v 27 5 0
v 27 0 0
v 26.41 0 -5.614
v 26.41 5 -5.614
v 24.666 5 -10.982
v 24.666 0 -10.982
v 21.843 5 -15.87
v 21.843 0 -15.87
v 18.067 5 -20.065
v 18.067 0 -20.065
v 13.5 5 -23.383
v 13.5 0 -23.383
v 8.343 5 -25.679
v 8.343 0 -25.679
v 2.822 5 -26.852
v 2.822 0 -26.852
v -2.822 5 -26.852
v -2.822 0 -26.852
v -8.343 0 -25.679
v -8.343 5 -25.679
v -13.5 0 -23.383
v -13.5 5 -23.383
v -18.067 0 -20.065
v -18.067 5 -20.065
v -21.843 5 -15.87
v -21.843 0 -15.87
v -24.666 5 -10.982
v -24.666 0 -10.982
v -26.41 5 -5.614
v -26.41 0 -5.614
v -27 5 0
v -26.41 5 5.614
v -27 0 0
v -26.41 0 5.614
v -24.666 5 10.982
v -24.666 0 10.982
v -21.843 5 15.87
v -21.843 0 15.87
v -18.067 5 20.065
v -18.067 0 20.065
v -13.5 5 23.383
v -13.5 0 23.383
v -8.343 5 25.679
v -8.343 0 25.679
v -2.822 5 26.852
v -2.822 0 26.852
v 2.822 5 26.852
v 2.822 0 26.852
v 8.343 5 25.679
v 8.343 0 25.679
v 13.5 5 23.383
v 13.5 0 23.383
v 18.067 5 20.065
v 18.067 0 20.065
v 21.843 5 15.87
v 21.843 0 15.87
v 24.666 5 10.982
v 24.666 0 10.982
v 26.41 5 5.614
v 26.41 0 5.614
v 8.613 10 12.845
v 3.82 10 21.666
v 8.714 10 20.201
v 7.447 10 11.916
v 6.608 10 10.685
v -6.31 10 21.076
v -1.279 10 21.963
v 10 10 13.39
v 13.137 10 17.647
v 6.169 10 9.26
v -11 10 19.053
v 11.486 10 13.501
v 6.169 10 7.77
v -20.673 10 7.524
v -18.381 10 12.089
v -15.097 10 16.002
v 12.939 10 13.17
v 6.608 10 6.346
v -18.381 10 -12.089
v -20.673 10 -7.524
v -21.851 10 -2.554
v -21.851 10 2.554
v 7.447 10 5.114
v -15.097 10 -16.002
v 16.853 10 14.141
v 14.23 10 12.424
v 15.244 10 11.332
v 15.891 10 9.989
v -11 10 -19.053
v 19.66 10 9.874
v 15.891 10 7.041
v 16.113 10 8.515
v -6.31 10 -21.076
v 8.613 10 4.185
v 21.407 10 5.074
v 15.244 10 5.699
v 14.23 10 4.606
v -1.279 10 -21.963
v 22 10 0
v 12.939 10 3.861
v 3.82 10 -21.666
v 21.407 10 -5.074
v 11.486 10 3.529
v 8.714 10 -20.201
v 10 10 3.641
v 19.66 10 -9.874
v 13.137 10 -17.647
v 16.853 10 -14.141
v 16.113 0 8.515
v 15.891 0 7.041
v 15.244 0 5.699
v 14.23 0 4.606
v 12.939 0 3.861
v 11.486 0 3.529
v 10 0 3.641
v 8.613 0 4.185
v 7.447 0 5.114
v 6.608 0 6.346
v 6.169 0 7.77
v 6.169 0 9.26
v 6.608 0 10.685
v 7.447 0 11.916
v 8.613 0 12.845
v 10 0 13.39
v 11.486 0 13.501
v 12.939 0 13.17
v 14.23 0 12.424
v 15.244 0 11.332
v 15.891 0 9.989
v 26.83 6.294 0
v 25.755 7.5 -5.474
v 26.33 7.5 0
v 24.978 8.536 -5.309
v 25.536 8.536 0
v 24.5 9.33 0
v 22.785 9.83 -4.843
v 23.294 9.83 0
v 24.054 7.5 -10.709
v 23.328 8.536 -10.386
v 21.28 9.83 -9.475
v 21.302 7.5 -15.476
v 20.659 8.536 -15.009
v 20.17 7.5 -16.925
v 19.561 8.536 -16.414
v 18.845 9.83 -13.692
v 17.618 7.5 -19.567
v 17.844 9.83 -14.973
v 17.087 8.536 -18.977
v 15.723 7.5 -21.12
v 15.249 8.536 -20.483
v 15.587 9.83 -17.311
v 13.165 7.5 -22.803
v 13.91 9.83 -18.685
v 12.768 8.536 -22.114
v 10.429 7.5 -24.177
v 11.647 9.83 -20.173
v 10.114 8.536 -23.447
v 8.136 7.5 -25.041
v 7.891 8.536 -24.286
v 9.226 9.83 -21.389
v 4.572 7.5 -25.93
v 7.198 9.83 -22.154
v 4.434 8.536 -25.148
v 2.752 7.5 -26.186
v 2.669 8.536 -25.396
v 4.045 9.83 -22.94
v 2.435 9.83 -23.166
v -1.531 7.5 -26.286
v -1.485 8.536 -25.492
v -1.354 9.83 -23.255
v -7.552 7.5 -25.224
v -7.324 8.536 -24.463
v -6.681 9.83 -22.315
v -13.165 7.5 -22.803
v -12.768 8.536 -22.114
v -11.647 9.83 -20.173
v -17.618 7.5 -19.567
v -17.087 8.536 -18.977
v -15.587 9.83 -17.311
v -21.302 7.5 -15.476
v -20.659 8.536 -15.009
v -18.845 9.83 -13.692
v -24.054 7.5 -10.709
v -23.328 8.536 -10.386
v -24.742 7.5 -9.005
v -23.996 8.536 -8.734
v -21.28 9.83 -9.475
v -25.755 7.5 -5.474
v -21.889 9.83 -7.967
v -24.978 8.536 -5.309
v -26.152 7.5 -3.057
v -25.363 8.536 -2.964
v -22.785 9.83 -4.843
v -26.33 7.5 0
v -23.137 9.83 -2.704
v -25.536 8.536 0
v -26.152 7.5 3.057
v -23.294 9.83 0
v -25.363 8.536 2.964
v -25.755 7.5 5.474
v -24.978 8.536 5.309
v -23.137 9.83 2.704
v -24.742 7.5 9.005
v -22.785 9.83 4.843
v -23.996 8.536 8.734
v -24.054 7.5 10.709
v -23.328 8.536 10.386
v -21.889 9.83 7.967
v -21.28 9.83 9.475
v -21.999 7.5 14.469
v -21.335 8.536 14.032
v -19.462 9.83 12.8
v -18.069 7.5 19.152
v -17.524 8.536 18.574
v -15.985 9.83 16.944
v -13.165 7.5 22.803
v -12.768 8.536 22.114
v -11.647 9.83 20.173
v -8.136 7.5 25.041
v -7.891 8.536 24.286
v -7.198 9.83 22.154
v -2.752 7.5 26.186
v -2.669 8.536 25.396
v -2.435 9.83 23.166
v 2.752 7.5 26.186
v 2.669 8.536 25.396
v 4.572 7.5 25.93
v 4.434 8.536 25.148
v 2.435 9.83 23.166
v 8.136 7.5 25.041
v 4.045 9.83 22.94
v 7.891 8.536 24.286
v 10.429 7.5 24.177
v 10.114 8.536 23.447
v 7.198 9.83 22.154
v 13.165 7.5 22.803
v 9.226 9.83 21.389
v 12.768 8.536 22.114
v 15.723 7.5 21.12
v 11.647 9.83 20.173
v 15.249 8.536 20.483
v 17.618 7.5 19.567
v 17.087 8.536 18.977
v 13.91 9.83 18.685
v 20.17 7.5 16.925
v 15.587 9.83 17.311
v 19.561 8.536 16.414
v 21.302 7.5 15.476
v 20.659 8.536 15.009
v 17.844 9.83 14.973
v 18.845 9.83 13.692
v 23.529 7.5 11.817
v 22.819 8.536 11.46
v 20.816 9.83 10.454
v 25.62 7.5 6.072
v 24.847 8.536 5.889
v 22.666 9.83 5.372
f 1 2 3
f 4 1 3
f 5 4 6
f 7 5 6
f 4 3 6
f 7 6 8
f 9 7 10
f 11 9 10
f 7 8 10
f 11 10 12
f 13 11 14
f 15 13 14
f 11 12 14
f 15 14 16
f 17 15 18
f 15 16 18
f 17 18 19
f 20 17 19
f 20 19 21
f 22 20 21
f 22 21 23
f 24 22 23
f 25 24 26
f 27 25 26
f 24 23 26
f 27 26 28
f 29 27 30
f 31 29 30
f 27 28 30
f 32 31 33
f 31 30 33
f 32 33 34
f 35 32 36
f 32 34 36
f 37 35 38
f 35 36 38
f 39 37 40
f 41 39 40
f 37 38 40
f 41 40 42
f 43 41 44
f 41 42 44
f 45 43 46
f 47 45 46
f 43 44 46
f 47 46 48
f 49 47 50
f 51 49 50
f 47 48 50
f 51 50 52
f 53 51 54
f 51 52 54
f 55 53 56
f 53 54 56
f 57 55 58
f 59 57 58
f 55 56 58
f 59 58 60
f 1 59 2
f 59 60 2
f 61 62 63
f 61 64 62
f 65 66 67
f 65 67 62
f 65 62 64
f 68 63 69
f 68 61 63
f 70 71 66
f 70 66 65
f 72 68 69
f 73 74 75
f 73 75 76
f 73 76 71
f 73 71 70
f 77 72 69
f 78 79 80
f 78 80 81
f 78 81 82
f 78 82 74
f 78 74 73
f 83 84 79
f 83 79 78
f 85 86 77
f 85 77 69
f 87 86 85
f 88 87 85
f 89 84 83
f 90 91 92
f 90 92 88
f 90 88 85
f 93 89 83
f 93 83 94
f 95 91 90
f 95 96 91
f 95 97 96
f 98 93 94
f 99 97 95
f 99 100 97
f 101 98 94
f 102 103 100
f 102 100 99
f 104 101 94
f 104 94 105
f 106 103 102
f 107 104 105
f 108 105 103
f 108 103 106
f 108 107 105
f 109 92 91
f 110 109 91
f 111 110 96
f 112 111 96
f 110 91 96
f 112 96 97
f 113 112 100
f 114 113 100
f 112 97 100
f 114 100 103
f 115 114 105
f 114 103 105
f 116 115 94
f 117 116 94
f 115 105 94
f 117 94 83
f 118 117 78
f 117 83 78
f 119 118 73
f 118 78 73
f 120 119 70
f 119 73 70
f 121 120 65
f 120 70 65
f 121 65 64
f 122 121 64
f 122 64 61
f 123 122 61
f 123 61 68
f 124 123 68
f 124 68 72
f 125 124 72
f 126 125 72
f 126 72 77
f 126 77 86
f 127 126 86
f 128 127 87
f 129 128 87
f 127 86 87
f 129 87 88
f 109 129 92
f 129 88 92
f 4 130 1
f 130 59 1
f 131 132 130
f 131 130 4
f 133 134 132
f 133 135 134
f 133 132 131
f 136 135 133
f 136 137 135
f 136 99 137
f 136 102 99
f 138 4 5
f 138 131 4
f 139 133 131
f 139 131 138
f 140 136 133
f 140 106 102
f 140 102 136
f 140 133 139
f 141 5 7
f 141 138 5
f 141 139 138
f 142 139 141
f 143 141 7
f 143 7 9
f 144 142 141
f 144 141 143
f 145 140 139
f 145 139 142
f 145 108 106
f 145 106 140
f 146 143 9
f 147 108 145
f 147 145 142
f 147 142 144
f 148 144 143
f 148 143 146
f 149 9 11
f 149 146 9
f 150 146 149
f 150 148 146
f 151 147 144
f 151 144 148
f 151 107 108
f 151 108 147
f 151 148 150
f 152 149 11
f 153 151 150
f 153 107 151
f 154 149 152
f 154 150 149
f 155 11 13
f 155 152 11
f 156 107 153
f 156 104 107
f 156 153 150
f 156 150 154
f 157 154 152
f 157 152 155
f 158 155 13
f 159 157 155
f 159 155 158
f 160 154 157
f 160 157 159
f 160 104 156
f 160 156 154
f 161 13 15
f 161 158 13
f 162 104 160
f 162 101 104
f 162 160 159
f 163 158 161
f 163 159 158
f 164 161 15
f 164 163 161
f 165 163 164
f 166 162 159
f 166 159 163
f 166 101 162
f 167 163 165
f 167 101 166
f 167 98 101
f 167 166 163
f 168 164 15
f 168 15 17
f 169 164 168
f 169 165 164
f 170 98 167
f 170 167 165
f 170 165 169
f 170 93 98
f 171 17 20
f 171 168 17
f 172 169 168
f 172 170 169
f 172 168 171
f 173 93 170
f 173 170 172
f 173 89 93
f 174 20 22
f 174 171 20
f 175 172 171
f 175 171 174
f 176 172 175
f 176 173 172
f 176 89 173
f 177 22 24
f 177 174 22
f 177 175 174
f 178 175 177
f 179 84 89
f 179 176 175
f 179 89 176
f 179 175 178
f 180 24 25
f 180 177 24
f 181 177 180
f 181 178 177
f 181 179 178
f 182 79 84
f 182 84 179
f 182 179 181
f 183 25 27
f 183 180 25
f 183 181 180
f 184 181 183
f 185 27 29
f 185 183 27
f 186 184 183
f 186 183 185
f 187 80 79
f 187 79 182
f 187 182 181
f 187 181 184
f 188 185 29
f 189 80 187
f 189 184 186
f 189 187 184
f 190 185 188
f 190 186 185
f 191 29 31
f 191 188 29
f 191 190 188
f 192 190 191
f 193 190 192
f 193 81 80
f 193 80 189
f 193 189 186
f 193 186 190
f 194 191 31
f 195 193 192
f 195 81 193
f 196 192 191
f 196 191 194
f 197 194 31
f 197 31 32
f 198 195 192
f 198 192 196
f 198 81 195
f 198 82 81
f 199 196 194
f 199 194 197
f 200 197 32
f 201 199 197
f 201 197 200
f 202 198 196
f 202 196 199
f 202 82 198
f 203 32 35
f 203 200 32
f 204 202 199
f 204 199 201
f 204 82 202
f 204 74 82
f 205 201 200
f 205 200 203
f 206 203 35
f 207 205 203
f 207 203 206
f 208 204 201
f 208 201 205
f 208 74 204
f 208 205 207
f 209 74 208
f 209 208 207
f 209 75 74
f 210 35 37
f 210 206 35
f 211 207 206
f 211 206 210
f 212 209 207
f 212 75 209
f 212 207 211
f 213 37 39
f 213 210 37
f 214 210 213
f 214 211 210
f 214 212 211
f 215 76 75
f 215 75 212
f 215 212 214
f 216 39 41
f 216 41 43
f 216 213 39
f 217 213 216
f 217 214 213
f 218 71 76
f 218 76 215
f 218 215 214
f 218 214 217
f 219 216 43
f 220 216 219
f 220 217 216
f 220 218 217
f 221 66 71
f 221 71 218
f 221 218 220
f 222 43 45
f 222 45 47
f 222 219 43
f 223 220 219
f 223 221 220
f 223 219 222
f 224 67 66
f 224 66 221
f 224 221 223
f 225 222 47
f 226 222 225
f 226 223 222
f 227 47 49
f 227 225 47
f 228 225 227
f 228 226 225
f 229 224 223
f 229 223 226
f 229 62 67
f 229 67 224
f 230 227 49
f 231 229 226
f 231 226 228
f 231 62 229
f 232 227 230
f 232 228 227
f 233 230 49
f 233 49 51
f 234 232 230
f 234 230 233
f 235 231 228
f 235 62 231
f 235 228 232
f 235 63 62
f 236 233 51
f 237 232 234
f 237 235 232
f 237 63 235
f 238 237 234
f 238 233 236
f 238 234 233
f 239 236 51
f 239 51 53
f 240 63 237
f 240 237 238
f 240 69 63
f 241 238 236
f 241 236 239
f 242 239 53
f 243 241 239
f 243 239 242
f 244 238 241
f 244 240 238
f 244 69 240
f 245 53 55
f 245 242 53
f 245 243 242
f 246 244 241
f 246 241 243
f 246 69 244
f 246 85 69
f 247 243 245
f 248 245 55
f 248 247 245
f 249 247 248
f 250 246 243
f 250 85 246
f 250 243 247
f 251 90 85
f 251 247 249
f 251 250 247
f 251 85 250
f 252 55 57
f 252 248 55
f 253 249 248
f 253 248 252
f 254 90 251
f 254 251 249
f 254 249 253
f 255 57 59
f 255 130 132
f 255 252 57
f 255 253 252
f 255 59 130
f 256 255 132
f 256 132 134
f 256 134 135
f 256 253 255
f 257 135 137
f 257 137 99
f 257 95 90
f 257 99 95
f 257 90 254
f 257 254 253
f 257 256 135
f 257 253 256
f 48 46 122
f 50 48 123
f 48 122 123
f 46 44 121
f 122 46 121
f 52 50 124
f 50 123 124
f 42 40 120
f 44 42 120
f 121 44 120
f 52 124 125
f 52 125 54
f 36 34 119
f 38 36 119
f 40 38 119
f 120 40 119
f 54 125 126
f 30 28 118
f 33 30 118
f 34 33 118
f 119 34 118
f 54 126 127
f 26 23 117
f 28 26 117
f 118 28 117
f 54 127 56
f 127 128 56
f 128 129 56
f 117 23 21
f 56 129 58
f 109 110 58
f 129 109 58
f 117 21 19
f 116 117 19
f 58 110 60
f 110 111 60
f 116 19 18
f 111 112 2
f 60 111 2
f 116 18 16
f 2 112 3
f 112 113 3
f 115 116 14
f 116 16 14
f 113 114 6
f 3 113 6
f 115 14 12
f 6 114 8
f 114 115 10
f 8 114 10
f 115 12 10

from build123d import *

# Parameters (mm, degrees)
SKETCH1_R           = 27
BOSS_EXTRUDE1_DEPTH = 10
FILLET1_R           = 5
SKETCH2_R           = 5
CUT_EXTRUDE1_DEPTH  = 10


with BuildPart() as part:
    # Sketch1 → Boss-Extrude1 (new body)
    with BuildSketch(Plane(origin=(0, 0, 0), x_dir=(1, 0, 0), z_dir=(0, 1, 0))):
        Circle(SKETCH1_R)
    extrude(amount=BOSS_EXTRUDE1_DEPTH)

    # Fillet1
    fillet1_edges = [part.edges().sort_by_distance(p)[0] for p in [
        (-27, 10, 0),
    ]]
    fillet(fillet1_edges, radius=FILLET1_R)

    # Sketch2 → Cut-Extrude1 (cut)
    with BuildSketch(Plane(origin=(0, 10, 0), x_dir=(1, 0, 0), z_dir=(0, 1, 0))):
        with Locations((11.112679592, -8.515183631)):
            Circle(SKETCH2_R)
    extrude(amount=-CUT_EXTRUDE1_DEPTH, mode=Mode.SUBTRACT)


solid = part.part
